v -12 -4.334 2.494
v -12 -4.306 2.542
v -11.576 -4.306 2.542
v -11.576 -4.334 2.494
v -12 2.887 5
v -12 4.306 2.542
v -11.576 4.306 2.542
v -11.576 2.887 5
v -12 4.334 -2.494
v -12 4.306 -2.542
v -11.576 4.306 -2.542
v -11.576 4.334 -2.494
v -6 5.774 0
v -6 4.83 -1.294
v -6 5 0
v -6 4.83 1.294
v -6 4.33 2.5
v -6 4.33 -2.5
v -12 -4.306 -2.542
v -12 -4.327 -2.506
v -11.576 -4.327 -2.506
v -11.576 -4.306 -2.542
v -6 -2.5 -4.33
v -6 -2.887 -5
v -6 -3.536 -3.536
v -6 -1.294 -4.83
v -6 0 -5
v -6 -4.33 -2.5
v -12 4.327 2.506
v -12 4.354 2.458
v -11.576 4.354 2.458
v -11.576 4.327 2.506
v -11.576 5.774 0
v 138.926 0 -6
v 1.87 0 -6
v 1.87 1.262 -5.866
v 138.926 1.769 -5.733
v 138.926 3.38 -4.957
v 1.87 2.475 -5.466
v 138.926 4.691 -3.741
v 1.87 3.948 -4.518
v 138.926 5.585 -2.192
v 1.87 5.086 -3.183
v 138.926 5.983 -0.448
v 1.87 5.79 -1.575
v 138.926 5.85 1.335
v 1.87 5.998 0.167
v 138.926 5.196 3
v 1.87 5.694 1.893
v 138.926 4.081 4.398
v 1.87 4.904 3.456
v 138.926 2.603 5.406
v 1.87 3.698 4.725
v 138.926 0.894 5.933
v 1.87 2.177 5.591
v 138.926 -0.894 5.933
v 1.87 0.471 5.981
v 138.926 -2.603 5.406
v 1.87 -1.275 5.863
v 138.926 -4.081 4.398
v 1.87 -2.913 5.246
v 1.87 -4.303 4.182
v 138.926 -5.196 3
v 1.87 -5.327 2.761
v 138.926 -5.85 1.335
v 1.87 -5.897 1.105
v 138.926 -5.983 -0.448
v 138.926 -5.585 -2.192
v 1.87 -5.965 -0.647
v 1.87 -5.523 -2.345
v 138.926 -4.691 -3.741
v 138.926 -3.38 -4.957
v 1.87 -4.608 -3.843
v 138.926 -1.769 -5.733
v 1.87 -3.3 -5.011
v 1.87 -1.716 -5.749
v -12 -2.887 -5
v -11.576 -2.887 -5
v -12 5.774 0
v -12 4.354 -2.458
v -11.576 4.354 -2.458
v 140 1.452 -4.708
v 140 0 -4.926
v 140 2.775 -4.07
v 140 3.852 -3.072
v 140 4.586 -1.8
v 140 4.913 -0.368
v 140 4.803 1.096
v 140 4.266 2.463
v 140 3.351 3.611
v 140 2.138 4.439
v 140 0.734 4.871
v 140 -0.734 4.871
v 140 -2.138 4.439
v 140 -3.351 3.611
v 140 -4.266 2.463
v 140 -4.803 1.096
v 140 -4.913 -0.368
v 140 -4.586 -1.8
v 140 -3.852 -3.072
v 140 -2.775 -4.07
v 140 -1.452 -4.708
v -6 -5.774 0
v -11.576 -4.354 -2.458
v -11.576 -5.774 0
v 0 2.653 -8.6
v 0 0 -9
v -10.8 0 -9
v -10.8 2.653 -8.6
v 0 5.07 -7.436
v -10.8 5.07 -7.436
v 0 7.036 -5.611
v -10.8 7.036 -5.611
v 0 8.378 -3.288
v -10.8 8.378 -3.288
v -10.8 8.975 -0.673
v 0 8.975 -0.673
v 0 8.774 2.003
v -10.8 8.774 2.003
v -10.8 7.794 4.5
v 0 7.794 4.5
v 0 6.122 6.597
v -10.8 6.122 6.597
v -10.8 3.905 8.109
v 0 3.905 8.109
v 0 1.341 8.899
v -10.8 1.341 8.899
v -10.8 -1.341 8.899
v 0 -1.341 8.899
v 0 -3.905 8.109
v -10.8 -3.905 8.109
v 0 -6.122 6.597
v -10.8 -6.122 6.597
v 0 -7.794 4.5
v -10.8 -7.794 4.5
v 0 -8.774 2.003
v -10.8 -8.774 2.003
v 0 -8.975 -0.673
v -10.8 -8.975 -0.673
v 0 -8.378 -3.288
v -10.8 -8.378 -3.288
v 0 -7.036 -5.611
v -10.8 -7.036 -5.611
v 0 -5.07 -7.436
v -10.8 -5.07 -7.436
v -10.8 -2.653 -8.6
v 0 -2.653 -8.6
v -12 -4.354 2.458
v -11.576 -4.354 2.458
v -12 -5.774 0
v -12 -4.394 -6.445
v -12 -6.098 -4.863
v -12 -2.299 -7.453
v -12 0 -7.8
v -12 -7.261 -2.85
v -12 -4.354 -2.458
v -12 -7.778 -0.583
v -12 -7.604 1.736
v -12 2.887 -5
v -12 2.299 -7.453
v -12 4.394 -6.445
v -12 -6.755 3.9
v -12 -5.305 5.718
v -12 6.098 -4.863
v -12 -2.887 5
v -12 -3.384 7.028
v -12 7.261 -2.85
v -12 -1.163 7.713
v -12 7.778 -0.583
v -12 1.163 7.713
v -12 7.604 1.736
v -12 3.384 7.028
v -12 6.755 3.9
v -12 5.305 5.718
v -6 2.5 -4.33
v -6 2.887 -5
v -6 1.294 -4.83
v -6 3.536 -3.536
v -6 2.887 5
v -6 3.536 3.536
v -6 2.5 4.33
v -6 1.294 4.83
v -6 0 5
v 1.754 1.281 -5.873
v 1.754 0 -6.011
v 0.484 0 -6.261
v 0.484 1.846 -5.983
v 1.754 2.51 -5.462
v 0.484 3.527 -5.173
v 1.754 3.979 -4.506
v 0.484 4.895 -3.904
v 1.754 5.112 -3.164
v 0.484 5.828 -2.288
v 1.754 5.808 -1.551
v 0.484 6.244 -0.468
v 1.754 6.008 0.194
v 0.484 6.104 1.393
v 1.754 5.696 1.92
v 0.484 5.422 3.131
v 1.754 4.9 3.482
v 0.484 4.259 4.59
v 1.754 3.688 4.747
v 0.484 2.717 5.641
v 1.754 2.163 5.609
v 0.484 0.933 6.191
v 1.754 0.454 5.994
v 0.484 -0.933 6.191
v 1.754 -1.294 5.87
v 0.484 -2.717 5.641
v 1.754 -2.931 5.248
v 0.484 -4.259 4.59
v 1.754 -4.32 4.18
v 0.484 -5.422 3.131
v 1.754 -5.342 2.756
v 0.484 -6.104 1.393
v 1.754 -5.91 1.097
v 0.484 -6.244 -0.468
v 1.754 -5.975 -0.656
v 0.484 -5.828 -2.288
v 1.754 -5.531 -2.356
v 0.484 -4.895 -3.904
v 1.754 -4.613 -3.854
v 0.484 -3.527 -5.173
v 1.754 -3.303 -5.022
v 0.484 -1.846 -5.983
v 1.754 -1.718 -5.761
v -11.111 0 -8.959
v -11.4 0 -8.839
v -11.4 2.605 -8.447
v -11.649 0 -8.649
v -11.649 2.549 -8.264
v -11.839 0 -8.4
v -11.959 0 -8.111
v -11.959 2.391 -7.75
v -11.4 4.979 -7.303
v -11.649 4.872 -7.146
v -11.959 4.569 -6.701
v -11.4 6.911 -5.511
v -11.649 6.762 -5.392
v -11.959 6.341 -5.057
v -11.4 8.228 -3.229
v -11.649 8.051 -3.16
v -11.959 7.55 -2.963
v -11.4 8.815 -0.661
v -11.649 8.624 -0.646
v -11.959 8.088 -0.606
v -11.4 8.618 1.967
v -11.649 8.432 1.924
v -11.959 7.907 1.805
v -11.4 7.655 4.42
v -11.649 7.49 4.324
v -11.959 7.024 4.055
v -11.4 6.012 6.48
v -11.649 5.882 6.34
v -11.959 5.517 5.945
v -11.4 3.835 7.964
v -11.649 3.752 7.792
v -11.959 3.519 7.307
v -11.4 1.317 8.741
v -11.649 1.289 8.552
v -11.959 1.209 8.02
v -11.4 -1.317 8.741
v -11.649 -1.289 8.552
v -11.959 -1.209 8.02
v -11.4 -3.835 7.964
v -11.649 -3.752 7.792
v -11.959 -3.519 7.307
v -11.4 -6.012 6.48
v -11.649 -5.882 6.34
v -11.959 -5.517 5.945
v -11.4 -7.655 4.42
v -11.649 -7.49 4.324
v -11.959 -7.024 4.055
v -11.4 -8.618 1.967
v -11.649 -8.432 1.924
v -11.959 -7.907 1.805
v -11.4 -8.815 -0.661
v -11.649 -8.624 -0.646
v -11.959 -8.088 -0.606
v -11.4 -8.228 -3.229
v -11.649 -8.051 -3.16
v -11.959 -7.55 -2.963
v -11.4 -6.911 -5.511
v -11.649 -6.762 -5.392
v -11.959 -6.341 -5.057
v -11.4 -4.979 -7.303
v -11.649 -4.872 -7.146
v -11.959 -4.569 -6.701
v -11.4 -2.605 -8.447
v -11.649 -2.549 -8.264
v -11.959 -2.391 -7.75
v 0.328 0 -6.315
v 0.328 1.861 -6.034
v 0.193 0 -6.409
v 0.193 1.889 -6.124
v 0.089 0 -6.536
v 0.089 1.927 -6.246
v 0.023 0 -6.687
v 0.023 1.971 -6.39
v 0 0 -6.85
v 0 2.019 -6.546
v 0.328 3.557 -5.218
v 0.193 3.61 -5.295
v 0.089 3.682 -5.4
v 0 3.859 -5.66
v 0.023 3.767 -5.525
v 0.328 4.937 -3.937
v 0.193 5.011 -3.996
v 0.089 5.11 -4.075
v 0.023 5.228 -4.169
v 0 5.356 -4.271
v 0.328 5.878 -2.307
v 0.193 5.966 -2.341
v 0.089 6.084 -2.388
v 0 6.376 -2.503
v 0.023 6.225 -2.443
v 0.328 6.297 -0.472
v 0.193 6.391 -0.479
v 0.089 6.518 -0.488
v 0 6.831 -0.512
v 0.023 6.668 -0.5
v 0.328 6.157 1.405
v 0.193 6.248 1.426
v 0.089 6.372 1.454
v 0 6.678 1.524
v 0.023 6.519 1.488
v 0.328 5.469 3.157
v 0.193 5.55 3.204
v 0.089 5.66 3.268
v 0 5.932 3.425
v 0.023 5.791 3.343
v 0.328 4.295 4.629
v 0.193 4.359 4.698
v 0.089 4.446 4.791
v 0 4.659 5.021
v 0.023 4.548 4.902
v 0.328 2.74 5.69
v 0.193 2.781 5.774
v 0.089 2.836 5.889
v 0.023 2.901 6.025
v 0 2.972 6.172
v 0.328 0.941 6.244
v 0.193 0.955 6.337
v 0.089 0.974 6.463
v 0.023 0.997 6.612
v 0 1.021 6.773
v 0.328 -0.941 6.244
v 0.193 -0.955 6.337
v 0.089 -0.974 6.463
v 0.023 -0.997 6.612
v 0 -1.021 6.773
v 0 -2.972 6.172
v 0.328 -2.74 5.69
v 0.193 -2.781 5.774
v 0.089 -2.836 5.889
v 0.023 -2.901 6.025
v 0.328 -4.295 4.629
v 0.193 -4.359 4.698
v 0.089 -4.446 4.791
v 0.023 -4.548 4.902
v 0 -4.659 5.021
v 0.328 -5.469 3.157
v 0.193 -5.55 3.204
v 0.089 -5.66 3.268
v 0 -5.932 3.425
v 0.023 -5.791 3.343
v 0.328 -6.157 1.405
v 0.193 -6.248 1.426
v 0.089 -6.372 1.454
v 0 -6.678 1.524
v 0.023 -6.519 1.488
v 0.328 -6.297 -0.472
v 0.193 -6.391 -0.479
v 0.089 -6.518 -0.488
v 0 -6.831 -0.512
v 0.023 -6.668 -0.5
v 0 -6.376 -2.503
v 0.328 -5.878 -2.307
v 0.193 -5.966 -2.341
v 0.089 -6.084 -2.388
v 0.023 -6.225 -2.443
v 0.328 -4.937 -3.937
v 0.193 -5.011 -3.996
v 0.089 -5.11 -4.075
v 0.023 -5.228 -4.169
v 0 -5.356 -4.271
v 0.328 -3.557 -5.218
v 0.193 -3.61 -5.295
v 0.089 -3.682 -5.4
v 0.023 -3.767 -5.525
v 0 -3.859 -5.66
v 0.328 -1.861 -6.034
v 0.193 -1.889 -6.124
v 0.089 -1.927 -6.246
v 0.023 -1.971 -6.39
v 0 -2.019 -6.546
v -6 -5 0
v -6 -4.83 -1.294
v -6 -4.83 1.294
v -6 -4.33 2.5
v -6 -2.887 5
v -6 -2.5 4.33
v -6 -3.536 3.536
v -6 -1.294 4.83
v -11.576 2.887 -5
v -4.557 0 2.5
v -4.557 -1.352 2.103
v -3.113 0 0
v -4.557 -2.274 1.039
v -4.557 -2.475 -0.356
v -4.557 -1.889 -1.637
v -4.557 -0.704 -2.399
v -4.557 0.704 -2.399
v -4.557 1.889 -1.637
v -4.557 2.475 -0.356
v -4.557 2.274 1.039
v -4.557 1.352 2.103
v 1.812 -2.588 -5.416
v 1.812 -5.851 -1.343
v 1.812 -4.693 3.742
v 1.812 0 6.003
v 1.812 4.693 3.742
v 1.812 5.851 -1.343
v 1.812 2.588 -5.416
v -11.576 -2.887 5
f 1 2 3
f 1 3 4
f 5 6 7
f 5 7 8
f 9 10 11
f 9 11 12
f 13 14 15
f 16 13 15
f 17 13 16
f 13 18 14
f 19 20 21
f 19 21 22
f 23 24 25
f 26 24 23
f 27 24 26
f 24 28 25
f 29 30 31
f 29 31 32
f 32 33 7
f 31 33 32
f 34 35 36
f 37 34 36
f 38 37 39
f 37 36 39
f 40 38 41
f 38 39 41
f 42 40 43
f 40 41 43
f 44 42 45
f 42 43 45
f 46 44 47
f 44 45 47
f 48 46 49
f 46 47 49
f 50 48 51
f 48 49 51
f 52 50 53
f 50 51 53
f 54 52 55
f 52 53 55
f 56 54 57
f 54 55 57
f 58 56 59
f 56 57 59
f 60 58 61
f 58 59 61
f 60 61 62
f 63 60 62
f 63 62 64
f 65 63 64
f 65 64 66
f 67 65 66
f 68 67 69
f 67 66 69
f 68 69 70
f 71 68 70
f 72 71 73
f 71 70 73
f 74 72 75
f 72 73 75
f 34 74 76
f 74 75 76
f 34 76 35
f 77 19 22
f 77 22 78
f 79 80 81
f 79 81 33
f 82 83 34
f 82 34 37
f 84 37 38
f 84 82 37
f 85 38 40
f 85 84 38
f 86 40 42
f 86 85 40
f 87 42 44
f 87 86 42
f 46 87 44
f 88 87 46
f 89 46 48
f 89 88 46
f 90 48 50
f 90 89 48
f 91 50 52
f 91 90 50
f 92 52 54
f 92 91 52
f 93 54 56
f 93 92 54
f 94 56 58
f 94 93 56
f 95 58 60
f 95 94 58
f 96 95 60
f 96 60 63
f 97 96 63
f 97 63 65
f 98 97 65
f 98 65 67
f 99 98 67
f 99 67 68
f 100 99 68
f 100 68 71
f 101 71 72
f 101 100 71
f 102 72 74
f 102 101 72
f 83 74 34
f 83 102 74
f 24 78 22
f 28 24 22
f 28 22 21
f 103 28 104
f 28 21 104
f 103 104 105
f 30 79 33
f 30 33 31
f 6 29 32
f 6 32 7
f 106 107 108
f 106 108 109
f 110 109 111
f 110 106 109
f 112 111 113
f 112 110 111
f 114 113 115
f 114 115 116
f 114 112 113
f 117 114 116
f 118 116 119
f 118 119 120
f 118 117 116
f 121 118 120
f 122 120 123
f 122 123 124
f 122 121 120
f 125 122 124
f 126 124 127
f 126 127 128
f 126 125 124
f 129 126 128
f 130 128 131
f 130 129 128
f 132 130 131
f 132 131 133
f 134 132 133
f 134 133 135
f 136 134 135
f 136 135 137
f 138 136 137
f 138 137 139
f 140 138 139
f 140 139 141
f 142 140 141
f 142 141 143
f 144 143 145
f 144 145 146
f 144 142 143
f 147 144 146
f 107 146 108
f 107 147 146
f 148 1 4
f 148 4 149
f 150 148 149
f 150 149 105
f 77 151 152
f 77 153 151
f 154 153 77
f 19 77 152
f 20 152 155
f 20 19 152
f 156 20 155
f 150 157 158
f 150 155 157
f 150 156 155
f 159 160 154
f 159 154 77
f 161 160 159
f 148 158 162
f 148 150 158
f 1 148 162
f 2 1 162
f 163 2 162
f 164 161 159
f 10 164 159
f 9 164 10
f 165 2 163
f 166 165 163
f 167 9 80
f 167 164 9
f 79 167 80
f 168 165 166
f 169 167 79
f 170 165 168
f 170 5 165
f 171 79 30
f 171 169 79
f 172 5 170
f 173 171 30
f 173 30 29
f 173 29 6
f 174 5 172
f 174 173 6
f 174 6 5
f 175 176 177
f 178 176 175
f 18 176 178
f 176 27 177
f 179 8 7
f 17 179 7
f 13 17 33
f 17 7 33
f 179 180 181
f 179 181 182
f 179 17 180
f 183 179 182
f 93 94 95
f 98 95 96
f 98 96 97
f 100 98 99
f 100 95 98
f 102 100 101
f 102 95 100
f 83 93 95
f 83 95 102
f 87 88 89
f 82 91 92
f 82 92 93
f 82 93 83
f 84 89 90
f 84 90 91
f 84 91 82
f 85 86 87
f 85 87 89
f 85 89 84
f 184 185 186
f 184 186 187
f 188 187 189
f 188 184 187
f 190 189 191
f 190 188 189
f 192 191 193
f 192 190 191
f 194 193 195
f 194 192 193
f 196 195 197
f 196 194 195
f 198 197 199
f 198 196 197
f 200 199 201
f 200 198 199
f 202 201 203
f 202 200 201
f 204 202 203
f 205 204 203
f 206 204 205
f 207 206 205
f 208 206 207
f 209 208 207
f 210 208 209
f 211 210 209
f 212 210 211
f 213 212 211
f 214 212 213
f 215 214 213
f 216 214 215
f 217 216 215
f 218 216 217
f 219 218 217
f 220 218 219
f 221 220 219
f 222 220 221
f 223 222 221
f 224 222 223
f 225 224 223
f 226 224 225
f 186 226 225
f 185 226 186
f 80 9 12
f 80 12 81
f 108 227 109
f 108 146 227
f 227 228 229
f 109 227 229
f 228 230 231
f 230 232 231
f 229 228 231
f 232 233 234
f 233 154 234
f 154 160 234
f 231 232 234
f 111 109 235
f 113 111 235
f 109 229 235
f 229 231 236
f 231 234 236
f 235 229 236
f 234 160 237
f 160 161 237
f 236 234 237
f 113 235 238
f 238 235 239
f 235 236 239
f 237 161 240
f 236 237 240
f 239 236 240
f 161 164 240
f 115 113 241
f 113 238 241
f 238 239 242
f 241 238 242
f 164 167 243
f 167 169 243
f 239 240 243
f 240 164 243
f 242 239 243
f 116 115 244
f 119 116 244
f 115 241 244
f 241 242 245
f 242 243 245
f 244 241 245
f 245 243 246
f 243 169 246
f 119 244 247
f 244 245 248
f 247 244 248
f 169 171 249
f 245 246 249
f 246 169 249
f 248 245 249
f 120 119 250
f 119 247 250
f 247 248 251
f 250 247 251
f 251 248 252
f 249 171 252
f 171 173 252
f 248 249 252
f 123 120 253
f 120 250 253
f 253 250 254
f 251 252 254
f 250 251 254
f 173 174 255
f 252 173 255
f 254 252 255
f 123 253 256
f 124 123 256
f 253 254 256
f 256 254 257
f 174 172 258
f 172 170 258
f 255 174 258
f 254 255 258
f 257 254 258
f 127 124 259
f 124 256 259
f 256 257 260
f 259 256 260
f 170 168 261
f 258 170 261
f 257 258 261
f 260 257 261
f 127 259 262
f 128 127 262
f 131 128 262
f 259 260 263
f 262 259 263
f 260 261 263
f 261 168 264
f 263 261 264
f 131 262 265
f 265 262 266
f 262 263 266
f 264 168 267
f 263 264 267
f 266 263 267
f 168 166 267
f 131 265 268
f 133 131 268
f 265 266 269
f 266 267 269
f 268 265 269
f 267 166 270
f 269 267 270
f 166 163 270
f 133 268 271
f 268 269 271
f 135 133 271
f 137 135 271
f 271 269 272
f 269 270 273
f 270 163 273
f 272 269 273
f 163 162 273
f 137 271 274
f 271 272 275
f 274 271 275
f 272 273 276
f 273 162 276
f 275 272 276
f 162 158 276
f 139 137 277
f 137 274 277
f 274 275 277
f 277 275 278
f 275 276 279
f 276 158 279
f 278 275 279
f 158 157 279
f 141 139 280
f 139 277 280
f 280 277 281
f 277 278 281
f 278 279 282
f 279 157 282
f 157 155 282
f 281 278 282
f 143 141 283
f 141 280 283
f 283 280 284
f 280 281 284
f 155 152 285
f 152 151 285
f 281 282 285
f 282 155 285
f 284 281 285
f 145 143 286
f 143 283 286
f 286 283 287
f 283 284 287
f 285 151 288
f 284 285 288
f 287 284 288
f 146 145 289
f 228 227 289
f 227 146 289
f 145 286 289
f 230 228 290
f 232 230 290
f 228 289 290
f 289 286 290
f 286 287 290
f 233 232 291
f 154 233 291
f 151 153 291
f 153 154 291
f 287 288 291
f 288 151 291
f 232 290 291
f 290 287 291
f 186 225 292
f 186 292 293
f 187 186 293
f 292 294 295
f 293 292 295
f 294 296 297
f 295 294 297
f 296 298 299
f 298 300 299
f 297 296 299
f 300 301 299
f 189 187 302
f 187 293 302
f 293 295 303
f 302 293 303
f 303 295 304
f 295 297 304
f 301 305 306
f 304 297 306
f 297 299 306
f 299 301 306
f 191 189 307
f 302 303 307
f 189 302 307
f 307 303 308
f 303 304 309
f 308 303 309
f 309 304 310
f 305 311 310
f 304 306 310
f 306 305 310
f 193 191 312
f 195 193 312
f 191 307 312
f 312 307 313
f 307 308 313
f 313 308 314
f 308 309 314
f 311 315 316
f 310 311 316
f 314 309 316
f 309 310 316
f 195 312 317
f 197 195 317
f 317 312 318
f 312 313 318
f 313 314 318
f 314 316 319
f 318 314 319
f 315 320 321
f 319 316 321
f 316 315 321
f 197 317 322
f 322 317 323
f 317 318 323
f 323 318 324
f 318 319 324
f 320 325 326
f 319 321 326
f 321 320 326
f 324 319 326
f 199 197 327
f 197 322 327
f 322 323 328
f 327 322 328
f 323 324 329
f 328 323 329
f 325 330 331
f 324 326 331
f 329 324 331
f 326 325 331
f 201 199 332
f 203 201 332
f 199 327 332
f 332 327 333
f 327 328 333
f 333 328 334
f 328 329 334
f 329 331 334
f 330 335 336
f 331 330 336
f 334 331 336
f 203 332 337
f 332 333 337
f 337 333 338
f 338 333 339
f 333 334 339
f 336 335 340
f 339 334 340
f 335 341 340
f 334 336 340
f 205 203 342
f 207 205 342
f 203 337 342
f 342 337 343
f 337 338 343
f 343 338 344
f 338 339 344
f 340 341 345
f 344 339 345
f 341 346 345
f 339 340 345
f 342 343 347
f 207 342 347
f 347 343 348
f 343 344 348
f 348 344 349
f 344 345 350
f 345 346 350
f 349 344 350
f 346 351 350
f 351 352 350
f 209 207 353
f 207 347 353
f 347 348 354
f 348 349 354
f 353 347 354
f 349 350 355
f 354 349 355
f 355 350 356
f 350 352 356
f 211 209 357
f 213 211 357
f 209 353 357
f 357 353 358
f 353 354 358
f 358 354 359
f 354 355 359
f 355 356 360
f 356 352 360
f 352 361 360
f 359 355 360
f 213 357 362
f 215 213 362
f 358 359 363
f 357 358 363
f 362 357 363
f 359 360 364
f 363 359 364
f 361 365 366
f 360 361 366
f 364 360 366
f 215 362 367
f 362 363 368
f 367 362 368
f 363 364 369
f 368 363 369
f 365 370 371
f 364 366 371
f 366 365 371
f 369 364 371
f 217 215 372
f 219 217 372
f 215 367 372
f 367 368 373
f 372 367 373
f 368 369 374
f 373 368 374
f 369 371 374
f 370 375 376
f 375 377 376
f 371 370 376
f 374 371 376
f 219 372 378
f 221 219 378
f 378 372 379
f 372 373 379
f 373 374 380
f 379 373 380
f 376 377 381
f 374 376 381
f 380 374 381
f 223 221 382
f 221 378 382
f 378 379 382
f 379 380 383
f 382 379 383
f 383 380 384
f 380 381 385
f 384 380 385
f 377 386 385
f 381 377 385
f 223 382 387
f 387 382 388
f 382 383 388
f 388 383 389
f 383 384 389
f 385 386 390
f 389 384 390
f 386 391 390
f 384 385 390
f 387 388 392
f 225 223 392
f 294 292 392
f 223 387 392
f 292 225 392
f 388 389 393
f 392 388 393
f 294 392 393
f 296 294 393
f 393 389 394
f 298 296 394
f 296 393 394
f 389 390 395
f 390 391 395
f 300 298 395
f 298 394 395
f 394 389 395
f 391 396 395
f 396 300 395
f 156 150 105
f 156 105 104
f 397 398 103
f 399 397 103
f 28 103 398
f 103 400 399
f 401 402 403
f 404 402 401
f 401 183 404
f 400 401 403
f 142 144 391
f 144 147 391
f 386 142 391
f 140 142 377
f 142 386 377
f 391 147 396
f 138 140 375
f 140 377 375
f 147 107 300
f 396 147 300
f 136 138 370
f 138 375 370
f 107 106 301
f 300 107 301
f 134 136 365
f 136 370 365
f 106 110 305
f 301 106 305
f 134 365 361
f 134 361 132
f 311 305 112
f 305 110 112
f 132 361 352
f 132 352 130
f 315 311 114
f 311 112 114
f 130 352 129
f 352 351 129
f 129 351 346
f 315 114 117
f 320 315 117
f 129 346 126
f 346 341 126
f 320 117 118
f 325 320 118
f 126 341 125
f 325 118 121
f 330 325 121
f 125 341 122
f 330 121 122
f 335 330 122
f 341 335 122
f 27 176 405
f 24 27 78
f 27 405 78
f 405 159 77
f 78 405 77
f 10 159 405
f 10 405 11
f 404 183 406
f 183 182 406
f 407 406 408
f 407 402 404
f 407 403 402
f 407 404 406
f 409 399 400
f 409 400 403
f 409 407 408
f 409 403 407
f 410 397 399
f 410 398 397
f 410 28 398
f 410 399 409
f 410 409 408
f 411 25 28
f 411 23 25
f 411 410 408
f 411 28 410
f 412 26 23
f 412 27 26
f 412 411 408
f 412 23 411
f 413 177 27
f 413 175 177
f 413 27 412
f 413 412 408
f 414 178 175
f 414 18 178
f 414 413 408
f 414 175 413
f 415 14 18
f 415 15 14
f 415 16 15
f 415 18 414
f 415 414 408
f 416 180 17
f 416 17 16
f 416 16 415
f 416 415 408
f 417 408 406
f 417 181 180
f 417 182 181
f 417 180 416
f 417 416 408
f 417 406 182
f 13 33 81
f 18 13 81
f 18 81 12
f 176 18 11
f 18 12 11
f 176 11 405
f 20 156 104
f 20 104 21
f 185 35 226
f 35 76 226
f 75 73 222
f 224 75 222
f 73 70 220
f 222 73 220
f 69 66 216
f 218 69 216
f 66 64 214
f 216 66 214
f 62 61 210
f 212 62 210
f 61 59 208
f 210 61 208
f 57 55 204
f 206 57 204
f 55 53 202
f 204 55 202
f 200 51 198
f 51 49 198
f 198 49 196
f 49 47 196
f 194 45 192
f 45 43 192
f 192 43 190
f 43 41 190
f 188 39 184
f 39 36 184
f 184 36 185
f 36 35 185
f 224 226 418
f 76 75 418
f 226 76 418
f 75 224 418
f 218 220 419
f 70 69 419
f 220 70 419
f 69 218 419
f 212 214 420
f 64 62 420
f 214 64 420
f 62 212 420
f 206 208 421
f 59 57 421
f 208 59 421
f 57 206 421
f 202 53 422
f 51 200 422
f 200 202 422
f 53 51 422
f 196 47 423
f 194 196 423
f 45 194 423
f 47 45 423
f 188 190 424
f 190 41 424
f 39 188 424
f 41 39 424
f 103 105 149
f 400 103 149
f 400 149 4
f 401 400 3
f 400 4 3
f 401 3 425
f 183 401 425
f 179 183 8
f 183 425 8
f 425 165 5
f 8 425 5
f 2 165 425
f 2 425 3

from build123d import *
from build123d.topology import SkipClean

# Parameters (mm, degrees)
SKETCH1_W           = 12
SKETCH1_H           = 9
CUT_EXTRUDE1_START  = 1.272656
CUT_EXTRUDE1_DEPTH  = 0.424218618
CUT_EXTRUDE2_DEPTH  = 5.575781382
SKETCH4_R           = 6.3565957
BOSS_EXTRUDE1_DEPTH = 1.811506156
BOSS_EXTRUDE1_TAPER = 11.136309431
SKETCH5_R           = 6
BOSS_EXTRUDE2_DEPTH = 138.188493844
CHAMFER1_SIZE       = 1.0735
FILLET1_R           = 0.6
FILLET2_R           = 1.2


with BuildPart() as part:
    # Sketch1 → Revolve1 (revolve)
    with BuildSketch(Plane.XY, mode=Mode.PRIVATE) as revolve1_sk:
        with Locations((-6, 4.5)):
            Rectangle(SKETCH1_W, SKETCH1_H)
    revolve(revolve1_sk.sketch.rotate(Axis((-12, 0, 0), (1, 0, 0)), 270), axis=Axis((-12, 0, 0), (1, 0, 0)))

    # Sketch2 → Cut-Extrude1 (cut)
    with BuildSketch(Plane.ZY.offset(10.727344145).offset(CUT_EXTRUDE1_START)):
        Polygon((-2.541695199, 4.306054284), (-2.494007969, 4.33358652), (-2.458304232, 4.354200082), (0, 5.773502692), (2.458305244, 4.354200082), (2.505992237, 4.326667984), (2.541695697, 4.306054284), (5, 2.886751346), (5, 0.048145191), (5, -0.00115583), (5, -0.048145419), (5, -2.886751346), (2.541695697, -4.306053956), (2.494008981, -4.333586191), (2.458305244, -4.354199753), (0, -5.773502692), (-2.458304232, -4.354199753), (-2.505991462, -4.326667518), (-2.541695199, -4.306053956), (-5, -2.886751346), (-5, -0.048145419), (-5, -0.00115583), (-5, 0.048145191), (-5, 2.886751346), align=None)
    extrude(amount=-CUT_EXTRUDE1_DEPTH, mode=Mode.SUBTRACT)

    # Sketch3 → Cut-Extrude2 (cut)
    with SkipClean():  # the faces are left unmerged after this step: merging them gives an invalid solid
        with BuildSketch(Plane.ZY.offset(11.575781382)):
            Polygon((0, 5.773502692), (-5, 2.886751346), (-5, -2.886751346), (0, -5.773502692), (5, -2.886751346), (5, 2.886751346), align=None)
        extrude(amount=-CUT_EXTRUDE2_DEPTH, mode=Mode.SUBTRACT)

    # Sketch4 → Boss-Extrude1 (add)
    with SkipClean():  # the faces are left unmerged after this step: merging them gives an invalid solid
        with BuildSketch(Plane(origin=(0, 0, 0), x_dir=(0, 0, -1), z_dir=(1, 0, 0))):
            Circle(SKETCH4_R)
        extrude(amount=BOSS_EXTRUDE1_DEPTH, taper=BOSS_EXTRUDE1_TAPER)

    # Sketch5 → Boss-Extrude2 (add)
    with SkipClean():  # the faces are left unmerged after this step: merging them gives an invalid solid
        with BuildSketch(Plane(origin=(1.811506156, 0, 0), x_dir=(0, 0, -1), z_dir=(1, 0, 0))):
            Circle(SKETCH5_R)
        extrude(amount=BOSS_EXTRUDE2_DEPTH)

    # Sketch6 → Cut-Revolve1 (revolve, cut)
    with SkipClean():  # the faces are left unmerged after this step: merging them gives an invalid solid
        with BuildSketch(Plane.XY, mode=Mode.PRIVATE) as cut_revolve1_sk:
            Polygon((-6, 5), (-6, 0), (-3.113248654, 0), align=None)
        revolve(cut_revolve1_sk.sketch.rotate(Axis((-6, 0, 0), (1, 0, 0)), 90), axis=Axis((-6, 0, 0), (1, 0, 0)), mode=Mode.SUBTRACT)

    # Chamfer1
    chamfer1_edges = [part.edges().sort_by_distance(p)[0] for p in [
        (140, 0, 6),
    ]]
    chamfer(chamfer1_edges, length=CHAMFER1_SIZE)

    # Fillet1
    fillet1_edges = [part.edges().sort_by_distance(p)[0] for p in [
        (0, 0, 6.3565957),
        (1.811506156, 0, 6),
    ]]
    fillet(fillet1_edges, radius=FILLET1_R)

    # Fillet2
    fillet2_edges = [part.edges().sort_by_distance(p)[0] for p in [
        (-12, 0, 9),
    ]]
    fillet(fillet2_edges, radius=FILLET2_R)


solid = part.part
